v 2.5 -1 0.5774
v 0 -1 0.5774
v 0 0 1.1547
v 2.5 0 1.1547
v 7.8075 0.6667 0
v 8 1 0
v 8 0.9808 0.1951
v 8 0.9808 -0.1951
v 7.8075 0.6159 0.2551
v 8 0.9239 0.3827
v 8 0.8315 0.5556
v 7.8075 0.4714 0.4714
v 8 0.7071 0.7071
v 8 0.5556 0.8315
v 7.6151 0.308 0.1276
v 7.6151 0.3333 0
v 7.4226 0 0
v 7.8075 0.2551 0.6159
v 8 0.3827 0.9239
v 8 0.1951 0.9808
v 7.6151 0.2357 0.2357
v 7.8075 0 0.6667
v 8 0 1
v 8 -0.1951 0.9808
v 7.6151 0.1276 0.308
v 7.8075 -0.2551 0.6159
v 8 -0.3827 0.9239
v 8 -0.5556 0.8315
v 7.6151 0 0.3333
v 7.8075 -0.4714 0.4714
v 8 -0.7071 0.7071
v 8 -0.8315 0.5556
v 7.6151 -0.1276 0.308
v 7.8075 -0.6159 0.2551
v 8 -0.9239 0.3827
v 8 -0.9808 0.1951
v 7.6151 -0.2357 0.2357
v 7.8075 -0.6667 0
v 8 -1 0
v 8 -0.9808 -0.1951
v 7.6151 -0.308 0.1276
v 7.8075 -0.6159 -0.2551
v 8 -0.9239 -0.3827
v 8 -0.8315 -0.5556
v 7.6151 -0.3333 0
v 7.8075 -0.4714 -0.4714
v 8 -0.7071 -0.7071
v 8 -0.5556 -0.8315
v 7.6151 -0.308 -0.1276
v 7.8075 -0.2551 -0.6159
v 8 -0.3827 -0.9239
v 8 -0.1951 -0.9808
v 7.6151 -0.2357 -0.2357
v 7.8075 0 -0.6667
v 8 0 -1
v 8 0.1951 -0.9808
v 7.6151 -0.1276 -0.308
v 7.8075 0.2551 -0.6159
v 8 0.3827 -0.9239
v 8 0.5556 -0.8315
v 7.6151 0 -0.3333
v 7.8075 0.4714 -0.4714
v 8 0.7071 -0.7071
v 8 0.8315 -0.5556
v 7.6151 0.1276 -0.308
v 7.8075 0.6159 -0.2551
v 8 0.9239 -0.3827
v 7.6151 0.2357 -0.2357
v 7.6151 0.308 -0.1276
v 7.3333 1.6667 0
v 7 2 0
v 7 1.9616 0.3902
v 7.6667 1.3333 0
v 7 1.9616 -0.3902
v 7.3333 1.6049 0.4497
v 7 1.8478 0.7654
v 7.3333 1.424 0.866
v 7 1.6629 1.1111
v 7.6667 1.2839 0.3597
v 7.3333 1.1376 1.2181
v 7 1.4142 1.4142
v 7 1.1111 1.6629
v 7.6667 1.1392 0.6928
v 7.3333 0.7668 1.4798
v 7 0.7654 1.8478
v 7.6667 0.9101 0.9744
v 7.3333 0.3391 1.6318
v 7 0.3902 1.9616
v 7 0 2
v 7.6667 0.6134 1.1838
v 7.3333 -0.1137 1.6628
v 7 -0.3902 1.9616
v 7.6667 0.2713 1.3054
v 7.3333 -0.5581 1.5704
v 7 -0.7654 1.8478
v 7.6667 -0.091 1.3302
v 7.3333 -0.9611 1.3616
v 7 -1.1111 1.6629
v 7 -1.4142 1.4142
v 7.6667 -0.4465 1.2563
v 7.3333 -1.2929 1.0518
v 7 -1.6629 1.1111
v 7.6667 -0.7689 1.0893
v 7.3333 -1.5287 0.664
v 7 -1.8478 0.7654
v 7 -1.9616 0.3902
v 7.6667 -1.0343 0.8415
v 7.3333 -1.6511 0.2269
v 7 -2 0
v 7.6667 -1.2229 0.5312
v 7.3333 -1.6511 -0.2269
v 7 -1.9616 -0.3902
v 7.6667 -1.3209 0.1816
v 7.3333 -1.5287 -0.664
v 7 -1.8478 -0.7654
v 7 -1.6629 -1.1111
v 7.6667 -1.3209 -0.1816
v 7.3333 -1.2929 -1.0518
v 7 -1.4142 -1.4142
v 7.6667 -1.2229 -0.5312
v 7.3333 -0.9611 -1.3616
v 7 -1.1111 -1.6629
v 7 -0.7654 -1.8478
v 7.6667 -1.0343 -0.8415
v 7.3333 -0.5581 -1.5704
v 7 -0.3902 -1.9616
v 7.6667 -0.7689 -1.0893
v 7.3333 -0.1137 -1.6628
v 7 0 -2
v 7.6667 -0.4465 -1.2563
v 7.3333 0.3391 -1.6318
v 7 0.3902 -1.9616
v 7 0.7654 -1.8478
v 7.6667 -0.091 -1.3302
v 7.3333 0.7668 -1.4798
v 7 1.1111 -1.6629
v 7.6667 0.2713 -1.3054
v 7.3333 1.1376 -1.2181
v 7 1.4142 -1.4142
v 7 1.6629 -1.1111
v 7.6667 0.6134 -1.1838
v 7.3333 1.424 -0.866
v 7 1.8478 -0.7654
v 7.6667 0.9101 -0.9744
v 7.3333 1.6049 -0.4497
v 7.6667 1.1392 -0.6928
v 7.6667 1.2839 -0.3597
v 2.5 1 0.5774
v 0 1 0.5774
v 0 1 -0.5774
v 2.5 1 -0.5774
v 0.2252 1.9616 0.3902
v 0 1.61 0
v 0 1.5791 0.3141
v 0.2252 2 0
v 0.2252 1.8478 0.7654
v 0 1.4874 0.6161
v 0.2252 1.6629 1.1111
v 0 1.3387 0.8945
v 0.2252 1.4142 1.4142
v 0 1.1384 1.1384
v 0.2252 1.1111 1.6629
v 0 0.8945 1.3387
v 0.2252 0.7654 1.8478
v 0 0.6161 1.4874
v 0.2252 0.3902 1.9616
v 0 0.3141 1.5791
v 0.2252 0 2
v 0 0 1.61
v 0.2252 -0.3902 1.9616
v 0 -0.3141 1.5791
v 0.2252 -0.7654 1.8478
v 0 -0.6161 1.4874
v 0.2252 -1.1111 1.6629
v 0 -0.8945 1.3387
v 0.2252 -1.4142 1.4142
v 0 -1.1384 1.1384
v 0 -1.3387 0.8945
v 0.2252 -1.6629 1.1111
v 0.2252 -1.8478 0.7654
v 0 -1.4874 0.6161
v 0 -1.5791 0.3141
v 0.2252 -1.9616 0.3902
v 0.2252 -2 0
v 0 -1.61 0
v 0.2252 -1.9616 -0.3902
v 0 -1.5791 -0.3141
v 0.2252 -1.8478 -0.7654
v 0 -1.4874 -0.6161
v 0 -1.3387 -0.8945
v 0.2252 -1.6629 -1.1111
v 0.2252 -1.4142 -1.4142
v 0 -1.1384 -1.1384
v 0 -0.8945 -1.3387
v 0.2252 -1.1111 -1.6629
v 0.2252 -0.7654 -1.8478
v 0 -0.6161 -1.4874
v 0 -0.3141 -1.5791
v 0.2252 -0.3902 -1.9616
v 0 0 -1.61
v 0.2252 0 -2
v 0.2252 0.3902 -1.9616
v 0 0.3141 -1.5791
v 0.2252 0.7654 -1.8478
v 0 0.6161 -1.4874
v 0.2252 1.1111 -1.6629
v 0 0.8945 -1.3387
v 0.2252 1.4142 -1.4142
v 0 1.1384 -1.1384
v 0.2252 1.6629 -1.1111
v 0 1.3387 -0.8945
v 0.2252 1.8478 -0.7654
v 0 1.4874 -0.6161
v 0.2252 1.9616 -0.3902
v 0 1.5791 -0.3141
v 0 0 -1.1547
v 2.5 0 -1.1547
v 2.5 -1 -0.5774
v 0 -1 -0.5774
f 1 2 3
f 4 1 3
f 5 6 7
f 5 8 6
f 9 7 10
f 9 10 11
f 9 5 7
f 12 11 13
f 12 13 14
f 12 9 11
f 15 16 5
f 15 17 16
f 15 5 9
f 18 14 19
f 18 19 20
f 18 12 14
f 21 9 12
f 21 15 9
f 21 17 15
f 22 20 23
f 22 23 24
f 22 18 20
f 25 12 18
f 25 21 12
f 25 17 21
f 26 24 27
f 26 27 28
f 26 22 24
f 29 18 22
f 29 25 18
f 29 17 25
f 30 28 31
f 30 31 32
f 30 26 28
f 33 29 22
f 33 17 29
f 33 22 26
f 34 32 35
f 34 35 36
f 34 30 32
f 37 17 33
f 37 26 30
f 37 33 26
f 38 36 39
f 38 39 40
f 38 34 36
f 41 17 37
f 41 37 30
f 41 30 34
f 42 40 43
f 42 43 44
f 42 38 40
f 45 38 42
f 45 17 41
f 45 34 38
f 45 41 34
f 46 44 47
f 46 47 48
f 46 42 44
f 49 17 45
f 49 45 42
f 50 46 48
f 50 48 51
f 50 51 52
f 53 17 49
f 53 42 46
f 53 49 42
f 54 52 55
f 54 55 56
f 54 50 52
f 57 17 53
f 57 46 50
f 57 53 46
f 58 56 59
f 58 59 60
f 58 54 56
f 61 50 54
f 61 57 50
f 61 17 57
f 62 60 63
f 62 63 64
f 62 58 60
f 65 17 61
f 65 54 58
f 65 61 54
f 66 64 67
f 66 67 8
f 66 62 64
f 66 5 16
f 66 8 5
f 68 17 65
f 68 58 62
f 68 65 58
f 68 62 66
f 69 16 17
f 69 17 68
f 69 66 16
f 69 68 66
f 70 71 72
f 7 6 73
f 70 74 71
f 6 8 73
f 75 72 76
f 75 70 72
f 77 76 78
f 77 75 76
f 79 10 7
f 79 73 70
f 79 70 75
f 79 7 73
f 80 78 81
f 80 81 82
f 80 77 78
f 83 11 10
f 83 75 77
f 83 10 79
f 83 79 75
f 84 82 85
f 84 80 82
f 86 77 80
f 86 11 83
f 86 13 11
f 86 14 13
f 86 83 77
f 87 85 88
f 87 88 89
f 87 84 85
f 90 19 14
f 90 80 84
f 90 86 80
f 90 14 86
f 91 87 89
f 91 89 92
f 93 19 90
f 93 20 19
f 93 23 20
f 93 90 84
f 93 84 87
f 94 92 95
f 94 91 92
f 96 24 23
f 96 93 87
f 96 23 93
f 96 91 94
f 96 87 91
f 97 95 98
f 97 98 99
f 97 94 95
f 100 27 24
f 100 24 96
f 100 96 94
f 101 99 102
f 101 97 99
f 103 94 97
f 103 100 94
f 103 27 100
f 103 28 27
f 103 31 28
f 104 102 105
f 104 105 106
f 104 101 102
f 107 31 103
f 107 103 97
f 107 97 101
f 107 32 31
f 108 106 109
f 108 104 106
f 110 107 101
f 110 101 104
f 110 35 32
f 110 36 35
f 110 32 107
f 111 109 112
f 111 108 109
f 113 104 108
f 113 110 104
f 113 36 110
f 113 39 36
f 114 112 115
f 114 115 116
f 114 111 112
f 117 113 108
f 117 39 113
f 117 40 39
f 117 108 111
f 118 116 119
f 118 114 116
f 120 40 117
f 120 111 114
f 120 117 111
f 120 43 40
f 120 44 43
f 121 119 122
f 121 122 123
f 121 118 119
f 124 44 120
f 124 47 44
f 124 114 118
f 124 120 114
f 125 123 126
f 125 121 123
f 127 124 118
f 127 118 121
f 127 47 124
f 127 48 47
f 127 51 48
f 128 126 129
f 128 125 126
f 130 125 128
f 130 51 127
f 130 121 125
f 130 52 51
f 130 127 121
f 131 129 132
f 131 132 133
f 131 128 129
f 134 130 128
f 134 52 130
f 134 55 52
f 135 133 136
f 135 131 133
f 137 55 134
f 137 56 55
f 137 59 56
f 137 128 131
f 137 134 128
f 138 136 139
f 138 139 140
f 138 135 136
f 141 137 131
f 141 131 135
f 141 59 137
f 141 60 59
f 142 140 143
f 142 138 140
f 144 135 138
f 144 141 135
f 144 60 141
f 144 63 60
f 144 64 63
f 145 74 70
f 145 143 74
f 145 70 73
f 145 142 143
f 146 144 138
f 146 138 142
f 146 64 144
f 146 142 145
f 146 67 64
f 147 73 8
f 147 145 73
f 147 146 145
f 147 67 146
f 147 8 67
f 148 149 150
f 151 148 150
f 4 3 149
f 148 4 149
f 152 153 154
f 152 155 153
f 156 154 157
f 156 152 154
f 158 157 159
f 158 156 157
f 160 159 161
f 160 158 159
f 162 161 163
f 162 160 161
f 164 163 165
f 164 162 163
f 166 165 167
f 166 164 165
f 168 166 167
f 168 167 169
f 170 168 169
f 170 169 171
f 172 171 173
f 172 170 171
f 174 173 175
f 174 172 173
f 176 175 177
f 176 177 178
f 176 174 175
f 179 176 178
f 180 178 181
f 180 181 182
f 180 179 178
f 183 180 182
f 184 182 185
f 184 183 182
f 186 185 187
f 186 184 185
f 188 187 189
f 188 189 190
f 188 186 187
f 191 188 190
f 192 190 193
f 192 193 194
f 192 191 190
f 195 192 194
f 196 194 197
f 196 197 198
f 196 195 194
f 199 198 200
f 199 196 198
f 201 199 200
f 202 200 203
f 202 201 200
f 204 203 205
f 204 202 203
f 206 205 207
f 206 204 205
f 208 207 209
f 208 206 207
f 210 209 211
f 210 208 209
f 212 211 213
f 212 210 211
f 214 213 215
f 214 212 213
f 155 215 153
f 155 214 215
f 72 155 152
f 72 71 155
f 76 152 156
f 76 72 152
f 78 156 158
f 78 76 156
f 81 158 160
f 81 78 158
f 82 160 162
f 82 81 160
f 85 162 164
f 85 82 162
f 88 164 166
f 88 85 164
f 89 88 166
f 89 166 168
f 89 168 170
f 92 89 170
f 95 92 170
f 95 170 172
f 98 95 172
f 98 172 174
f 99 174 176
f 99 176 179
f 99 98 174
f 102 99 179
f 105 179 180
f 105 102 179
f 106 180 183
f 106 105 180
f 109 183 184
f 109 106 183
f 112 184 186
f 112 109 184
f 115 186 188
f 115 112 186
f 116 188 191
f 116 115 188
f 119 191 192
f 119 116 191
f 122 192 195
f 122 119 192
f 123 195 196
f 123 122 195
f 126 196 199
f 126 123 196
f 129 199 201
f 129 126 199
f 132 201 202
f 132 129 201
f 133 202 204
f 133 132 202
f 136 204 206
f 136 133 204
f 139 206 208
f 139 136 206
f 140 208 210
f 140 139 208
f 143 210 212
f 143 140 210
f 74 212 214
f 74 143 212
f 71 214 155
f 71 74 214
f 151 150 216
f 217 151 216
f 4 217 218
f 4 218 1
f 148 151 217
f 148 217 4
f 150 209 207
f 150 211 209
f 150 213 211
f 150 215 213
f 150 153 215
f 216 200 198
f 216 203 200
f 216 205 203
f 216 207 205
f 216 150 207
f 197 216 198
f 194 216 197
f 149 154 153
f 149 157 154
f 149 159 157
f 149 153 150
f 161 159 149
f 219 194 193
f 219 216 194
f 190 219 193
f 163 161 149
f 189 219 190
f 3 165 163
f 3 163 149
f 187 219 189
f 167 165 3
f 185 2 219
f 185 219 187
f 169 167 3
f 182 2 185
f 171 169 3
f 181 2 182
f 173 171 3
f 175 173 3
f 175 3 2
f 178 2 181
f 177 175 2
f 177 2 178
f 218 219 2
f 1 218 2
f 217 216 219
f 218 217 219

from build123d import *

# Parameters (mm, degrees)
HEX_2_DEPTH = 2.5


with BuildPart() as part:
    # BodySke → BaseBody (revolve)
    with BuildSketch(Plane.XY):
        Polygon((0, 0), (0, 1.61), (0.225166605, 2), (7, 2), (8, 1), (7.422649731, 0), align=None)
    revolve(axis=Axis((-12.7, 0, 0), (1, 0, 0)))

    # Sketch2 → Hex 2 (cut)
    with BuildSketch(Plane.ZY):
        Polygon((0.577350269, 1), (-0.577350269, 1), (-1.154700538, 0), (-0.577350269, -1), (0.577350269, -1), (1.154700538, 0), align=None)
    extrude(amount=-HEX_2_DEPTH, mode=Mode.SUBTRACT)


solid = part.part
